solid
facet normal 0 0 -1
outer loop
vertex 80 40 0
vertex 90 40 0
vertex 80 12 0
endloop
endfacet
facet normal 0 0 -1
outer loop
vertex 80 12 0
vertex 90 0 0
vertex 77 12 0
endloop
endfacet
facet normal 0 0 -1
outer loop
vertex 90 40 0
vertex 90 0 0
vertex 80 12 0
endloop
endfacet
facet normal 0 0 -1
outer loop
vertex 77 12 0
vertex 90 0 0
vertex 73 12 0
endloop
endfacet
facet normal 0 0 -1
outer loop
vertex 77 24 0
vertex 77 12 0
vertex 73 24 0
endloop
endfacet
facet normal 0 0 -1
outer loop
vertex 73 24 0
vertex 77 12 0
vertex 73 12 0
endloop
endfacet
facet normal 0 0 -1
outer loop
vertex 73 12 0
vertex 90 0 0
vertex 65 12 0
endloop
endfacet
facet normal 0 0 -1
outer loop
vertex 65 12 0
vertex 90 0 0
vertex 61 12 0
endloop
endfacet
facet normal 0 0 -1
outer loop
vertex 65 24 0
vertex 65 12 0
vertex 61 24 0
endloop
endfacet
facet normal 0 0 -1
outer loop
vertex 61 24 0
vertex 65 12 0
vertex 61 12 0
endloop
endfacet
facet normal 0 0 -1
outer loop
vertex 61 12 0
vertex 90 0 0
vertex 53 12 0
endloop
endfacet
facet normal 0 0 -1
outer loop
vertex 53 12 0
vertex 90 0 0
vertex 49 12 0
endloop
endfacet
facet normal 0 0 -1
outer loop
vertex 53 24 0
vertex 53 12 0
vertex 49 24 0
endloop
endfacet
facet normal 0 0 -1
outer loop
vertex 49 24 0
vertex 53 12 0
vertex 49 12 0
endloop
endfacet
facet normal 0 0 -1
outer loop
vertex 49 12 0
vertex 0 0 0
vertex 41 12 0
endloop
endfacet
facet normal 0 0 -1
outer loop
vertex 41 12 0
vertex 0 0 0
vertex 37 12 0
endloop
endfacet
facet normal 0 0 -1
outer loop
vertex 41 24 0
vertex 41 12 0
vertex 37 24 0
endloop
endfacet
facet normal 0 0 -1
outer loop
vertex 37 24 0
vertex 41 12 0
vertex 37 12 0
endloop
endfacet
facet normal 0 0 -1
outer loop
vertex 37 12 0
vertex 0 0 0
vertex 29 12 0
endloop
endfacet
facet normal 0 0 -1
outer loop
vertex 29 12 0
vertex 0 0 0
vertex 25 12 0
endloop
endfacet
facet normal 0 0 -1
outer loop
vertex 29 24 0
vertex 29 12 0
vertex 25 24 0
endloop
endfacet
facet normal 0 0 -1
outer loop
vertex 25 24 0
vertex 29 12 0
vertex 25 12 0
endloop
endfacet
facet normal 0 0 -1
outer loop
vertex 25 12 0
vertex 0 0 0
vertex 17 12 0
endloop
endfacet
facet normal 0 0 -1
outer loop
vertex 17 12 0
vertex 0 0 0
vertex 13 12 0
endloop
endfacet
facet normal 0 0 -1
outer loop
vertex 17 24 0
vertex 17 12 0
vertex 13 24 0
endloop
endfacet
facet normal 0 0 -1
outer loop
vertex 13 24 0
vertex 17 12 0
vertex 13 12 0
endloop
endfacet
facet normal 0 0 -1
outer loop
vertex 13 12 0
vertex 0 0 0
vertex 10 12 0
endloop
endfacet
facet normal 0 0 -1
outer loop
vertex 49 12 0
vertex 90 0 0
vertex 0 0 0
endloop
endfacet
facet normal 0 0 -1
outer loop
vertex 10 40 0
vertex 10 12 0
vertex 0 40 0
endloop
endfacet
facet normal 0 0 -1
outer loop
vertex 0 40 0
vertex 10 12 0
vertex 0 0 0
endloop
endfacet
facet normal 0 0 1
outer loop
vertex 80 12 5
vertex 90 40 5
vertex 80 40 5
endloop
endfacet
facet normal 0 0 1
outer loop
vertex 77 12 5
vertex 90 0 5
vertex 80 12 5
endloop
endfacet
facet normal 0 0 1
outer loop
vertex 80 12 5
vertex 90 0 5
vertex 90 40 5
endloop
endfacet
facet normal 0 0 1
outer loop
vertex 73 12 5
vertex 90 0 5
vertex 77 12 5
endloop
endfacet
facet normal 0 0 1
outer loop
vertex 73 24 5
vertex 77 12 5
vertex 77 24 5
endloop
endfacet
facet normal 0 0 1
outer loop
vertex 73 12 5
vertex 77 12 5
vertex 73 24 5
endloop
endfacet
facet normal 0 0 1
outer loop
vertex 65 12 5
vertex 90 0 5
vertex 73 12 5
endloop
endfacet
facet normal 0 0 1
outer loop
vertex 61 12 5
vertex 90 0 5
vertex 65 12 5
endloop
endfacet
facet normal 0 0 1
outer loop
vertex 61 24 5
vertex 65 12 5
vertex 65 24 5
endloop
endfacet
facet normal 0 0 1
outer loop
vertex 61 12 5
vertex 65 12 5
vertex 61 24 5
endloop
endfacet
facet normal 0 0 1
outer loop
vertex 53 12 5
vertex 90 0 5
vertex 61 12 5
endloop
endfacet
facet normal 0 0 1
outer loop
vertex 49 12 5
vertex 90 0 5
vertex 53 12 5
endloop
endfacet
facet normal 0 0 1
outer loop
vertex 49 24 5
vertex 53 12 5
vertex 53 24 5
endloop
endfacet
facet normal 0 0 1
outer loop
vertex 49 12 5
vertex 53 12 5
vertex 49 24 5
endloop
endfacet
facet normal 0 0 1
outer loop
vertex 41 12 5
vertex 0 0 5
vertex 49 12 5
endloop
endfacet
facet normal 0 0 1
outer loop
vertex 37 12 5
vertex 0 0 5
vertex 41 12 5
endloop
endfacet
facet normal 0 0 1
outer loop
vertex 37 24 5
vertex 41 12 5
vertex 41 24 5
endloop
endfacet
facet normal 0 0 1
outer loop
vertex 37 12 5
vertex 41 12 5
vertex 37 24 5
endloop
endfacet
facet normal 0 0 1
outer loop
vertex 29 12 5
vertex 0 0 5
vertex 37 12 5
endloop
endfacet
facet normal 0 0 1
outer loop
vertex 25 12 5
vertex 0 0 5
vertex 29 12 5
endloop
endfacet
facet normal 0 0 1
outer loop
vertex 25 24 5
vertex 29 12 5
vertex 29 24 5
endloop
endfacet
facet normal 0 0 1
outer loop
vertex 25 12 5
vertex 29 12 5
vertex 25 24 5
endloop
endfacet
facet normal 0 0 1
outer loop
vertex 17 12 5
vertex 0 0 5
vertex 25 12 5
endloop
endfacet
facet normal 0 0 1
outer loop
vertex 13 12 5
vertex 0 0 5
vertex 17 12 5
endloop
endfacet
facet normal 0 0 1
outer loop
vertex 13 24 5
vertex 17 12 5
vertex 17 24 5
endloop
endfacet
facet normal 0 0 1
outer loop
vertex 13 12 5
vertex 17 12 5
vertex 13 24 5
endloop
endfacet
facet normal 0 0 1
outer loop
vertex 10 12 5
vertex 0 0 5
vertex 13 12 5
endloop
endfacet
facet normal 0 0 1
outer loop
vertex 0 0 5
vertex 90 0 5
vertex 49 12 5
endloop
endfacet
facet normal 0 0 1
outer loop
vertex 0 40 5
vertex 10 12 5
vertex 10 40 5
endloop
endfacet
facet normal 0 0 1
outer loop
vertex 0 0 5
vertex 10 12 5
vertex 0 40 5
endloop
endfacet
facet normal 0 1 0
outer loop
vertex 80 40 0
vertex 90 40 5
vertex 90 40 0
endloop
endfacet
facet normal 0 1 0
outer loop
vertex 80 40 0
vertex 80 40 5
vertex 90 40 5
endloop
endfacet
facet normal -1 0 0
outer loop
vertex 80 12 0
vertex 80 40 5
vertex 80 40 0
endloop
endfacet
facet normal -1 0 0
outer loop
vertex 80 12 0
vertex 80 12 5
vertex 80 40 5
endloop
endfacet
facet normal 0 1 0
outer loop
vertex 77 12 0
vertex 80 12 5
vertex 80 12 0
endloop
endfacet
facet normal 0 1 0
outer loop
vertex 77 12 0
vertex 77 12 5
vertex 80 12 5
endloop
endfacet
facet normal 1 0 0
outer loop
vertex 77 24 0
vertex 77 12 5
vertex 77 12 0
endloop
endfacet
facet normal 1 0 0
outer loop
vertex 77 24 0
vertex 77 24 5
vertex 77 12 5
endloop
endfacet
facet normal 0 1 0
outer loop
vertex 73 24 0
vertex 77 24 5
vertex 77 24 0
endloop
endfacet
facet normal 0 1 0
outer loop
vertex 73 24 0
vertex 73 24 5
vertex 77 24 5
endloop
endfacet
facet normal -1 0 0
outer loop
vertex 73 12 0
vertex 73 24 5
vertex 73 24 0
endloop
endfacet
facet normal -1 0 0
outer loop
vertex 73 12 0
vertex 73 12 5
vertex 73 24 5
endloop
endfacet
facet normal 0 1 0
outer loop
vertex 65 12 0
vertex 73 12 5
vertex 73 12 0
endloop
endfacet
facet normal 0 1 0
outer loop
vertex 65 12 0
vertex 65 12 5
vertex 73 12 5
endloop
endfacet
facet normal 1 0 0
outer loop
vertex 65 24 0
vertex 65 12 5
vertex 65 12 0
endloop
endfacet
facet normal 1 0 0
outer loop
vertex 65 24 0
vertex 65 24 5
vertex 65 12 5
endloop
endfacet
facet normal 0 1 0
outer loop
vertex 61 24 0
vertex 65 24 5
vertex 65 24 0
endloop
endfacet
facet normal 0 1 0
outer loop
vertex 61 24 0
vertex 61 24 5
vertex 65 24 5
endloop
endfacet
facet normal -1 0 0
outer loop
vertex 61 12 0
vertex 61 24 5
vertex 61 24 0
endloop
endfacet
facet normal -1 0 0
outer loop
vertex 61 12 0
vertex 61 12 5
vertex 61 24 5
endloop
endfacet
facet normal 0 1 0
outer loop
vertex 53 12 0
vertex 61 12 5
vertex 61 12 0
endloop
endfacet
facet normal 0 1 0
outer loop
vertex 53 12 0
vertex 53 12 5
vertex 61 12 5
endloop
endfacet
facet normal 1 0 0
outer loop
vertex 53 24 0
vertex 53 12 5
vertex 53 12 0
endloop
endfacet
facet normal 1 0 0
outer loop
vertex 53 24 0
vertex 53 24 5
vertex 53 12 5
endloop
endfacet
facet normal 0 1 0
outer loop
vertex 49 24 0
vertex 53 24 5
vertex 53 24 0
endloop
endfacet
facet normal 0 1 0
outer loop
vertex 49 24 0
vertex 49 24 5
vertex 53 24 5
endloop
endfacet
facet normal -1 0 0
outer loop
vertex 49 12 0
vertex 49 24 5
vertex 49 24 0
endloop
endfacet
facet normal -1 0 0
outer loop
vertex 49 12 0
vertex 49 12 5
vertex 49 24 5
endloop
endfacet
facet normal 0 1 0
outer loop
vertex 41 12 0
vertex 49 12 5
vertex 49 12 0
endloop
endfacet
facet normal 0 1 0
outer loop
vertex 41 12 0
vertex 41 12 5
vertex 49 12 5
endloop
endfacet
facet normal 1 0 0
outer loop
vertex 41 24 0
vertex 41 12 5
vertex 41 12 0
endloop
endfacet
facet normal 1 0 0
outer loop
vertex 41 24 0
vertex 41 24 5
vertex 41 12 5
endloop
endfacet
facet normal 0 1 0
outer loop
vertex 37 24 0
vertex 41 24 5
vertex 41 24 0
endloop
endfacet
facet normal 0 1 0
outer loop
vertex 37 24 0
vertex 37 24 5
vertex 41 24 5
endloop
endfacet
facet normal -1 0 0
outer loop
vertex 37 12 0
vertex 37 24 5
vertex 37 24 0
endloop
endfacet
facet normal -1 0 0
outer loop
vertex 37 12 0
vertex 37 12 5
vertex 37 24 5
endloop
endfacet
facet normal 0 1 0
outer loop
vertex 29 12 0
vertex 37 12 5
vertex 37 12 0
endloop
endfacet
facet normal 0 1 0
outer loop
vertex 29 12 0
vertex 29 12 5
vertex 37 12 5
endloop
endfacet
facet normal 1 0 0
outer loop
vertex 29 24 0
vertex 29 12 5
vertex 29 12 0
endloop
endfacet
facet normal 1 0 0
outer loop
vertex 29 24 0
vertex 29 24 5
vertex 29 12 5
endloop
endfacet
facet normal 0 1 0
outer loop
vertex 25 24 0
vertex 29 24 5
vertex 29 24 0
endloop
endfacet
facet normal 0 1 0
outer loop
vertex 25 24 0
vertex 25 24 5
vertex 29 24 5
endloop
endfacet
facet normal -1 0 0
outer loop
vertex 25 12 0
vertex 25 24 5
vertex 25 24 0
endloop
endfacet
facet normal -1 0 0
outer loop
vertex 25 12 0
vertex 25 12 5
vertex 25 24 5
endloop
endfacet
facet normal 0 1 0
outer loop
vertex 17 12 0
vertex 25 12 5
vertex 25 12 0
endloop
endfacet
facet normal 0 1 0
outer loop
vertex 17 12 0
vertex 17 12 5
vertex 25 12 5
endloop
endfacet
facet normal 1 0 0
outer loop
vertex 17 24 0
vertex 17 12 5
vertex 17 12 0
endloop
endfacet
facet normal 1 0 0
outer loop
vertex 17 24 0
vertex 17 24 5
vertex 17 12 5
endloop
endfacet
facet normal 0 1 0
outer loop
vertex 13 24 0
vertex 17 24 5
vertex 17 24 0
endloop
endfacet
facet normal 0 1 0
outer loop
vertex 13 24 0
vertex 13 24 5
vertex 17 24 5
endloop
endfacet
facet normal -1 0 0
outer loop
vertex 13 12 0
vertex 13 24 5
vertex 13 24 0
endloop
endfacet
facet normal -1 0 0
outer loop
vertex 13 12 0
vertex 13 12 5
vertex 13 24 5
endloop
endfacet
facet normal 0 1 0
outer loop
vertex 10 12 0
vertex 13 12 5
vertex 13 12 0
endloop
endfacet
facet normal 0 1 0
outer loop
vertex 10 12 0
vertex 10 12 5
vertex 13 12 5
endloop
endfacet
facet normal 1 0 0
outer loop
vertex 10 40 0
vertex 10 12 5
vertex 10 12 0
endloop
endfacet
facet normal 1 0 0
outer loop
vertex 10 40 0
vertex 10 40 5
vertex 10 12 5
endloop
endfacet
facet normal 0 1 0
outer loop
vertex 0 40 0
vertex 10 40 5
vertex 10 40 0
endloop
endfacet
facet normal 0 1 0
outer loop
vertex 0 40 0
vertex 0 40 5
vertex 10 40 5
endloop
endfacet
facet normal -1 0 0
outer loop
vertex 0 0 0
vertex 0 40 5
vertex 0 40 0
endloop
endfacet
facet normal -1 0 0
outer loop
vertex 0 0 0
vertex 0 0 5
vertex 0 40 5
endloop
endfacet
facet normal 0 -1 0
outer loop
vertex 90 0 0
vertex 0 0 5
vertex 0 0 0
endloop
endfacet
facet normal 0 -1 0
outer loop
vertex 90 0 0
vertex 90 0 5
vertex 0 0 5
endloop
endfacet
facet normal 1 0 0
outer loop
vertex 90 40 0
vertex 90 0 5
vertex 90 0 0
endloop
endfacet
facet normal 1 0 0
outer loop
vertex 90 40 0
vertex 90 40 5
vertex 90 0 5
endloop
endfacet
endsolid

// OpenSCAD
$fn = 32;

// ----------------------------------------------------------------------
// Guard grille: 6 slats over a 90 x 40 mm plate
// ----------------------------------------------------------------------

// --- parameters (mm) ---
profile_height = 5;       // extrusion height
profile_points = 32;      // points of the closed outline

profile = [[0, 0], [90, 0], [90, 40], [80, 40], [80, 12], [77, 12], [77, 24], [73, 24], [73, 12], [65, 12], [65, 24], [61, 24], [61, 12], [53, 12], [53, 24], [49, 24], [49, 12], [41, 12], [41, 24], [37, 24], [37, 12], [29, 12], [29, 24], [25, 24], [25, 12], [17, 12], [17, 24], [13, 24], [13, 12], [10, 12], [10, 40], [0, 40]];  // single closed polygon, 32 points, counter clockwise

// --- the one profile operation ---
linear_extrude(height = profile_height) polygon(points = profile);
